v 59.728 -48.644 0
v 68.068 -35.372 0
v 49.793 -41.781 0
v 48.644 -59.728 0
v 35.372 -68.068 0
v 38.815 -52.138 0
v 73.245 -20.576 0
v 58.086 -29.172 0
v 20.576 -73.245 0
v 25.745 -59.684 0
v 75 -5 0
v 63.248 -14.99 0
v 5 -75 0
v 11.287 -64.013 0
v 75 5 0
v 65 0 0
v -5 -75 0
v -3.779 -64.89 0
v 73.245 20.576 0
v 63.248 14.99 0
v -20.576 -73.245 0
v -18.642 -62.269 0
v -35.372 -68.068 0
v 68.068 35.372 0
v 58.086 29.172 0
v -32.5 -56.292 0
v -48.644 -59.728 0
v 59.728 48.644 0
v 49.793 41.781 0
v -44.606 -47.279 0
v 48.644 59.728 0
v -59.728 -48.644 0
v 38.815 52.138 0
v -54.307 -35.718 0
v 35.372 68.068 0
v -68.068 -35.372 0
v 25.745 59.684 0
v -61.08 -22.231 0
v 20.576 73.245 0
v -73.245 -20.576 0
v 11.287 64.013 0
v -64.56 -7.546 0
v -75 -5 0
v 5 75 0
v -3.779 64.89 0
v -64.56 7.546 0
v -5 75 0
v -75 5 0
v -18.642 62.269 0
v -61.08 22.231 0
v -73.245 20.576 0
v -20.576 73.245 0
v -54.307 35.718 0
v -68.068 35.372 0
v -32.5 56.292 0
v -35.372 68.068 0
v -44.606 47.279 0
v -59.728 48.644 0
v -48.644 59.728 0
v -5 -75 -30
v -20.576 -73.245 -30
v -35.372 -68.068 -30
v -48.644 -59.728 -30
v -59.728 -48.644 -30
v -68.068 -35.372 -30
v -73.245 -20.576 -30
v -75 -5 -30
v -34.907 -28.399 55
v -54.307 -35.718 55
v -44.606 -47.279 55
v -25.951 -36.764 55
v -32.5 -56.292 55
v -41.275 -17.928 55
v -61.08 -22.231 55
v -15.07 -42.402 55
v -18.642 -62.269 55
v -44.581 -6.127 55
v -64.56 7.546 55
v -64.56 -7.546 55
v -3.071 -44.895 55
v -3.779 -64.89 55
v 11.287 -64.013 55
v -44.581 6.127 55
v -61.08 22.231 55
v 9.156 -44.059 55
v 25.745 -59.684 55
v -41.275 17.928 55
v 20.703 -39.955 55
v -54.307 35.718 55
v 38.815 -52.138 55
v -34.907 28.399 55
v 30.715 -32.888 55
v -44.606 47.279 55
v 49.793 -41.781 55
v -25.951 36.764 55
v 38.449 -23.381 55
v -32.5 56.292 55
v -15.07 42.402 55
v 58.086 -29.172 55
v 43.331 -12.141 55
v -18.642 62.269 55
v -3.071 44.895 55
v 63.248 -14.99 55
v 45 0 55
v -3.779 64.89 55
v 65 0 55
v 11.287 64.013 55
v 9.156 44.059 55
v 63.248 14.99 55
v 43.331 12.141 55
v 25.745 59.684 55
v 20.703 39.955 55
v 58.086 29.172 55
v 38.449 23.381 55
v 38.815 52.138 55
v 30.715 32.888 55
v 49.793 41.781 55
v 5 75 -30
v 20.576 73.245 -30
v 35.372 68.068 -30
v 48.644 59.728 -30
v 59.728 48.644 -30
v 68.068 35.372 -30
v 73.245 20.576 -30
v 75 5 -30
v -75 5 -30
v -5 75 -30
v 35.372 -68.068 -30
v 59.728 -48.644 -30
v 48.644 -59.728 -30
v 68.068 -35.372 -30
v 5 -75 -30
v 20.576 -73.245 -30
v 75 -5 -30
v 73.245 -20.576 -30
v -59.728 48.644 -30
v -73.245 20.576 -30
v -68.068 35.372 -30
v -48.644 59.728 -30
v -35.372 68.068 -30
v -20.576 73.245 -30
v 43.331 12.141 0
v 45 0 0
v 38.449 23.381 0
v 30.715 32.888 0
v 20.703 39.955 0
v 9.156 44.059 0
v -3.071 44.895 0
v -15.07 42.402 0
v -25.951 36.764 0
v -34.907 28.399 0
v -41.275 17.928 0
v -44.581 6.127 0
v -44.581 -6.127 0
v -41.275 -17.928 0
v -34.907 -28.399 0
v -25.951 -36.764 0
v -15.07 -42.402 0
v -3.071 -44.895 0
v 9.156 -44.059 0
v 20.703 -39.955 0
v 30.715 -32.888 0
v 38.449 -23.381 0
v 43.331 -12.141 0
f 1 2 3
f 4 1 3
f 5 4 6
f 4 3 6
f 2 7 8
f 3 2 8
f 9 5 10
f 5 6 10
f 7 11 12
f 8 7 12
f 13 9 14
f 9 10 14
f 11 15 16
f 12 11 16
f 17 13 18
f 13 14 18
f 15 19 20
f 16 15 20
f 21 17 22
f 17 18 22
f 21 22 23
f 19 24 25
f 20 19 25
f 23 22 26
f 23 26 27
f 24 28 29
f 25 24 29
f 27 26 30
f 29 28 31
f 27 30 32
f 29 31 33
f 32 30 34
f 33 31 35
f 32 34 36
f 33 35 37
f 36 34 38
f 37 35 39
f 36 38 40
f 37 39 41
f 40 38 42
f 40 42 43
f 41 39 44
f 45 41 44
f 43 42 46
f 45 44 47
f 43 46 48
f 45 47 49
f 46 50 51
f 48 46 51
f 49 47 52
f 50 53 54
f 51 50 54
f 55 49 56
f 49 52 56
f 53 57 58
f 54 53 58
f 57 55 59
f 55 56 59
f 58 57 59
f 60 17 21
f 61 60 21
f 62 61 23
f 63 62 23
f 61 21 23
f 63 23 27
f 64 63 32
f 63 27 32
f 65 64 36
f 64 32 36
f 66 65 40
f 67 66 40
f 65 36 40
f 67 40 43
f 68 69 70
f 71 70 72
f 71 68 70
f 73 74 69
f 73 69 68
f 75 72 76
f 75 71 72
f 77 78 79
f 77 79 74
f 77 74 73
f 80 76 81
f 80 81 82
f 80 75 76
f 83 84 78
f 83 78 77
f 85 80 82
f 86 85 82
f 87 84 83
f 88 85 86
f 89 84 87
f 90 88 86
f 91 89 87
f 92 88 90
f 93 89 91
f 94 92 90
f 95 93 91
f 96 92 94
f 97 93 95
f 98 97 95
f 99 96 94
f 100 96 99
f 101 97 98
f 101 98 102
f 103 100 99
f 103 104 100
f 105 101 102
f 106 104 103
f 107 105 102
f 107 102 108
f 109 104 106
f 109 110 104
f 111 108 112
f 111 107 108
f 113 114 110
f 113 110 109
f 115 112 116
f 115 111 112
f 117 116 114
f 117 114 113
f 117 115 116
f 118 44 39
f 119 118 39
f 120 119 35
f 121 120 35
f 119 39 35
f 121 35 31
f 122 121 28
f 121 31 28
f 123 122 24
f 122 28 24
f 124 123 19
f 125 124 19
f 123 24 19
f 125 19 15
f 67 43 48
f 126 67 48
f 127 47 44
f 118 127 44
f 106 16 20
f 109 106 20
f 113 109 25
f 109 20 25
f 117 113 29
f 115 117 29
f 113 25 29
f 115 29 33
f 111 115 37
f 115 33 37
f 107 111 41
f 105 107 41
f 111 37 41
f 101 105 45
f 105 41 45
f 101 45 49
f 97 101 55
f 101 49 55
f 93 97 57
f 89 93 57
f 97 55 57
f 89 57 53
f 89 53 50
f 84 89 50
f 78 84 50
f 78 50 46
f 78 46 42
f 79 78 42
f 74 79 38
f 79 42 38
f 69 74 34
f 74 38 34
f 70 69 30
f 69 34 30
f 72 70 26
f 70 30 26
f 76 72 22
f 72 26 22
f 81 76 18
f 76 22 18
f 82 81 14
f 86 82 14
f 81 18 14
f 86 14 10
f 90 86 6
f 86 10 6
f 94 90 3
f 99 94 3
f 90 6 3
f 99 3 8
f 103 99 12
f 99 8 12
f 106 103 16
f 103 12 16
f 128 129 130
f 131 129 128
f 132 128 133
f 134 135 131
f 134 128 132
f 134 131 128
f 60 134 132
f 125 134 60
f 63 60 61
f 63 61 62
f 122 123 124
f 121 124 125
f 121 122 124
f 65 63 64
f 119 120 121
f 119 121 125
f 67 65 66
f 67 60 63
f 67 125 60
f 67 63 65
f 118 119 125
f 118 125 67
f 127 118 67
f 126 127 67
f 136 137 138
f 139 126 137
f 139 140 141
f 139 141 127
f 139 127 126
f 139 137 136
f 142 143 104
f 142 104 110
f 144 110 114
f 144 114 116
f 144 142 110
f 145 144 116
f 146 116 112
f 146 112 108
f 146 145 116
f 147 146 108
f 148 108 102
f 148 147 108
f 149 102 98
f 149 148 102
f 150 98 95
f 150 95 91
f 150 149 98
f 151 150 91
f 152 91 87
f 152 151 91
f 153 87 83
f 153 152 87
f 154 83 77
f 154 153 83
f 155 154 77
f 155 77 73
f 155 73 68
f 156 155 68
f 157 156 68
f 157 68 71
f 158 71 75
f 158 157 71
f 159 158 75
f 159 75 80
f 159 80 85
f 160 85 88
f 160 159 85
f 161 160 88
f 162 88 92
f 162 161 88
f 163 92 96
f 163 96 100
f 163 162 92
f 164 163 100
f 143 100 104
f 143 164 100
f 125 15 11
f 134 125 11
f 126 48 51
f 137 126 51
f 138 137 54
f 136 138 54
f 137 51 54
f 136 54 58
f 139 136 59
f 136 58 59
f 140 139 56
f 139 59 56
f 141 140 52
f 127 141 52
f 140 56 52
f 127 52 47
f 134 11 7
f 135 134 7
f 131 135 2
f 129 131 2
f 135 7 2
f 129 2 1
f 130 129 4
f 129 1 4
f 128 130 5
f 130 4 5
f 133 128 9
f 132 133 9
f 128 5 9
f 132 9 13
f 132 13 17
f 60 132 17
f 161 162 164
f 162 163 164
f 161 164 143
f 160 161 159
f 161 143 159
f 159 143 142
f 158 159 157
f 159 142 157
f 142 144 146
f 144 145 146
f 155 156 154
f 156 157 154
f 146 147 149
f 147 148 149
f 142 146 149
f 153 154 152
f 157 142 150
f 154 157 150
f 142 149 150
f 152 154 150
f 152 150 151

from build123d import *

# Parameters (mm, degrees)
SKETCH1_R           = 65
SKETCH1_R_2         = 45
BOSS_EXTRUDE1_DEPTH = 55
BOSS_EXTRUDE2_DEPTH = 30


with BuildPart() as part:
    # Sketch1 → Boss-Extrude1 (new body)
    with BuildSketch(Plane.XY):
        Circle(SKETCH1_R)
        Circle(SKETCH1_R_2, mode=Mode.SUBTRACT)
    extrude(amount=BOSS_EXTRUDE1_DEPTH)

    # Sketch2 → Boss-Extrude2 (add)
    with BuildSketch(Plane(origin=(0, 0, 0), x_dir=(-1, 0, 0), z_dir=(0, 0, -1))):
        with BuildLine():
            Line((-5, -75), (5, -75))
            ThreePointArc((5, -75), (54.497474683, -54.497474683), (75, -5))
            Line((75, -5), (75, 5))
            ThreePointArc((75, 5), (54.497474683, 54.497474683), (5, 75))
            Line((5, 75), (-5, 75))
            ThreePointArc((-5, 75), (-54.497474683, 54.497474683), (-75, 5))
            Line((-75, 5), (-75, -5))
            ThreePointArc((-75, -5), (-54.497474683, -54.497474683), (-5, -75))
        make_face()
    extrude(amount=BOSS_EXTRUDE2_DEPTH)


solid = part.part
